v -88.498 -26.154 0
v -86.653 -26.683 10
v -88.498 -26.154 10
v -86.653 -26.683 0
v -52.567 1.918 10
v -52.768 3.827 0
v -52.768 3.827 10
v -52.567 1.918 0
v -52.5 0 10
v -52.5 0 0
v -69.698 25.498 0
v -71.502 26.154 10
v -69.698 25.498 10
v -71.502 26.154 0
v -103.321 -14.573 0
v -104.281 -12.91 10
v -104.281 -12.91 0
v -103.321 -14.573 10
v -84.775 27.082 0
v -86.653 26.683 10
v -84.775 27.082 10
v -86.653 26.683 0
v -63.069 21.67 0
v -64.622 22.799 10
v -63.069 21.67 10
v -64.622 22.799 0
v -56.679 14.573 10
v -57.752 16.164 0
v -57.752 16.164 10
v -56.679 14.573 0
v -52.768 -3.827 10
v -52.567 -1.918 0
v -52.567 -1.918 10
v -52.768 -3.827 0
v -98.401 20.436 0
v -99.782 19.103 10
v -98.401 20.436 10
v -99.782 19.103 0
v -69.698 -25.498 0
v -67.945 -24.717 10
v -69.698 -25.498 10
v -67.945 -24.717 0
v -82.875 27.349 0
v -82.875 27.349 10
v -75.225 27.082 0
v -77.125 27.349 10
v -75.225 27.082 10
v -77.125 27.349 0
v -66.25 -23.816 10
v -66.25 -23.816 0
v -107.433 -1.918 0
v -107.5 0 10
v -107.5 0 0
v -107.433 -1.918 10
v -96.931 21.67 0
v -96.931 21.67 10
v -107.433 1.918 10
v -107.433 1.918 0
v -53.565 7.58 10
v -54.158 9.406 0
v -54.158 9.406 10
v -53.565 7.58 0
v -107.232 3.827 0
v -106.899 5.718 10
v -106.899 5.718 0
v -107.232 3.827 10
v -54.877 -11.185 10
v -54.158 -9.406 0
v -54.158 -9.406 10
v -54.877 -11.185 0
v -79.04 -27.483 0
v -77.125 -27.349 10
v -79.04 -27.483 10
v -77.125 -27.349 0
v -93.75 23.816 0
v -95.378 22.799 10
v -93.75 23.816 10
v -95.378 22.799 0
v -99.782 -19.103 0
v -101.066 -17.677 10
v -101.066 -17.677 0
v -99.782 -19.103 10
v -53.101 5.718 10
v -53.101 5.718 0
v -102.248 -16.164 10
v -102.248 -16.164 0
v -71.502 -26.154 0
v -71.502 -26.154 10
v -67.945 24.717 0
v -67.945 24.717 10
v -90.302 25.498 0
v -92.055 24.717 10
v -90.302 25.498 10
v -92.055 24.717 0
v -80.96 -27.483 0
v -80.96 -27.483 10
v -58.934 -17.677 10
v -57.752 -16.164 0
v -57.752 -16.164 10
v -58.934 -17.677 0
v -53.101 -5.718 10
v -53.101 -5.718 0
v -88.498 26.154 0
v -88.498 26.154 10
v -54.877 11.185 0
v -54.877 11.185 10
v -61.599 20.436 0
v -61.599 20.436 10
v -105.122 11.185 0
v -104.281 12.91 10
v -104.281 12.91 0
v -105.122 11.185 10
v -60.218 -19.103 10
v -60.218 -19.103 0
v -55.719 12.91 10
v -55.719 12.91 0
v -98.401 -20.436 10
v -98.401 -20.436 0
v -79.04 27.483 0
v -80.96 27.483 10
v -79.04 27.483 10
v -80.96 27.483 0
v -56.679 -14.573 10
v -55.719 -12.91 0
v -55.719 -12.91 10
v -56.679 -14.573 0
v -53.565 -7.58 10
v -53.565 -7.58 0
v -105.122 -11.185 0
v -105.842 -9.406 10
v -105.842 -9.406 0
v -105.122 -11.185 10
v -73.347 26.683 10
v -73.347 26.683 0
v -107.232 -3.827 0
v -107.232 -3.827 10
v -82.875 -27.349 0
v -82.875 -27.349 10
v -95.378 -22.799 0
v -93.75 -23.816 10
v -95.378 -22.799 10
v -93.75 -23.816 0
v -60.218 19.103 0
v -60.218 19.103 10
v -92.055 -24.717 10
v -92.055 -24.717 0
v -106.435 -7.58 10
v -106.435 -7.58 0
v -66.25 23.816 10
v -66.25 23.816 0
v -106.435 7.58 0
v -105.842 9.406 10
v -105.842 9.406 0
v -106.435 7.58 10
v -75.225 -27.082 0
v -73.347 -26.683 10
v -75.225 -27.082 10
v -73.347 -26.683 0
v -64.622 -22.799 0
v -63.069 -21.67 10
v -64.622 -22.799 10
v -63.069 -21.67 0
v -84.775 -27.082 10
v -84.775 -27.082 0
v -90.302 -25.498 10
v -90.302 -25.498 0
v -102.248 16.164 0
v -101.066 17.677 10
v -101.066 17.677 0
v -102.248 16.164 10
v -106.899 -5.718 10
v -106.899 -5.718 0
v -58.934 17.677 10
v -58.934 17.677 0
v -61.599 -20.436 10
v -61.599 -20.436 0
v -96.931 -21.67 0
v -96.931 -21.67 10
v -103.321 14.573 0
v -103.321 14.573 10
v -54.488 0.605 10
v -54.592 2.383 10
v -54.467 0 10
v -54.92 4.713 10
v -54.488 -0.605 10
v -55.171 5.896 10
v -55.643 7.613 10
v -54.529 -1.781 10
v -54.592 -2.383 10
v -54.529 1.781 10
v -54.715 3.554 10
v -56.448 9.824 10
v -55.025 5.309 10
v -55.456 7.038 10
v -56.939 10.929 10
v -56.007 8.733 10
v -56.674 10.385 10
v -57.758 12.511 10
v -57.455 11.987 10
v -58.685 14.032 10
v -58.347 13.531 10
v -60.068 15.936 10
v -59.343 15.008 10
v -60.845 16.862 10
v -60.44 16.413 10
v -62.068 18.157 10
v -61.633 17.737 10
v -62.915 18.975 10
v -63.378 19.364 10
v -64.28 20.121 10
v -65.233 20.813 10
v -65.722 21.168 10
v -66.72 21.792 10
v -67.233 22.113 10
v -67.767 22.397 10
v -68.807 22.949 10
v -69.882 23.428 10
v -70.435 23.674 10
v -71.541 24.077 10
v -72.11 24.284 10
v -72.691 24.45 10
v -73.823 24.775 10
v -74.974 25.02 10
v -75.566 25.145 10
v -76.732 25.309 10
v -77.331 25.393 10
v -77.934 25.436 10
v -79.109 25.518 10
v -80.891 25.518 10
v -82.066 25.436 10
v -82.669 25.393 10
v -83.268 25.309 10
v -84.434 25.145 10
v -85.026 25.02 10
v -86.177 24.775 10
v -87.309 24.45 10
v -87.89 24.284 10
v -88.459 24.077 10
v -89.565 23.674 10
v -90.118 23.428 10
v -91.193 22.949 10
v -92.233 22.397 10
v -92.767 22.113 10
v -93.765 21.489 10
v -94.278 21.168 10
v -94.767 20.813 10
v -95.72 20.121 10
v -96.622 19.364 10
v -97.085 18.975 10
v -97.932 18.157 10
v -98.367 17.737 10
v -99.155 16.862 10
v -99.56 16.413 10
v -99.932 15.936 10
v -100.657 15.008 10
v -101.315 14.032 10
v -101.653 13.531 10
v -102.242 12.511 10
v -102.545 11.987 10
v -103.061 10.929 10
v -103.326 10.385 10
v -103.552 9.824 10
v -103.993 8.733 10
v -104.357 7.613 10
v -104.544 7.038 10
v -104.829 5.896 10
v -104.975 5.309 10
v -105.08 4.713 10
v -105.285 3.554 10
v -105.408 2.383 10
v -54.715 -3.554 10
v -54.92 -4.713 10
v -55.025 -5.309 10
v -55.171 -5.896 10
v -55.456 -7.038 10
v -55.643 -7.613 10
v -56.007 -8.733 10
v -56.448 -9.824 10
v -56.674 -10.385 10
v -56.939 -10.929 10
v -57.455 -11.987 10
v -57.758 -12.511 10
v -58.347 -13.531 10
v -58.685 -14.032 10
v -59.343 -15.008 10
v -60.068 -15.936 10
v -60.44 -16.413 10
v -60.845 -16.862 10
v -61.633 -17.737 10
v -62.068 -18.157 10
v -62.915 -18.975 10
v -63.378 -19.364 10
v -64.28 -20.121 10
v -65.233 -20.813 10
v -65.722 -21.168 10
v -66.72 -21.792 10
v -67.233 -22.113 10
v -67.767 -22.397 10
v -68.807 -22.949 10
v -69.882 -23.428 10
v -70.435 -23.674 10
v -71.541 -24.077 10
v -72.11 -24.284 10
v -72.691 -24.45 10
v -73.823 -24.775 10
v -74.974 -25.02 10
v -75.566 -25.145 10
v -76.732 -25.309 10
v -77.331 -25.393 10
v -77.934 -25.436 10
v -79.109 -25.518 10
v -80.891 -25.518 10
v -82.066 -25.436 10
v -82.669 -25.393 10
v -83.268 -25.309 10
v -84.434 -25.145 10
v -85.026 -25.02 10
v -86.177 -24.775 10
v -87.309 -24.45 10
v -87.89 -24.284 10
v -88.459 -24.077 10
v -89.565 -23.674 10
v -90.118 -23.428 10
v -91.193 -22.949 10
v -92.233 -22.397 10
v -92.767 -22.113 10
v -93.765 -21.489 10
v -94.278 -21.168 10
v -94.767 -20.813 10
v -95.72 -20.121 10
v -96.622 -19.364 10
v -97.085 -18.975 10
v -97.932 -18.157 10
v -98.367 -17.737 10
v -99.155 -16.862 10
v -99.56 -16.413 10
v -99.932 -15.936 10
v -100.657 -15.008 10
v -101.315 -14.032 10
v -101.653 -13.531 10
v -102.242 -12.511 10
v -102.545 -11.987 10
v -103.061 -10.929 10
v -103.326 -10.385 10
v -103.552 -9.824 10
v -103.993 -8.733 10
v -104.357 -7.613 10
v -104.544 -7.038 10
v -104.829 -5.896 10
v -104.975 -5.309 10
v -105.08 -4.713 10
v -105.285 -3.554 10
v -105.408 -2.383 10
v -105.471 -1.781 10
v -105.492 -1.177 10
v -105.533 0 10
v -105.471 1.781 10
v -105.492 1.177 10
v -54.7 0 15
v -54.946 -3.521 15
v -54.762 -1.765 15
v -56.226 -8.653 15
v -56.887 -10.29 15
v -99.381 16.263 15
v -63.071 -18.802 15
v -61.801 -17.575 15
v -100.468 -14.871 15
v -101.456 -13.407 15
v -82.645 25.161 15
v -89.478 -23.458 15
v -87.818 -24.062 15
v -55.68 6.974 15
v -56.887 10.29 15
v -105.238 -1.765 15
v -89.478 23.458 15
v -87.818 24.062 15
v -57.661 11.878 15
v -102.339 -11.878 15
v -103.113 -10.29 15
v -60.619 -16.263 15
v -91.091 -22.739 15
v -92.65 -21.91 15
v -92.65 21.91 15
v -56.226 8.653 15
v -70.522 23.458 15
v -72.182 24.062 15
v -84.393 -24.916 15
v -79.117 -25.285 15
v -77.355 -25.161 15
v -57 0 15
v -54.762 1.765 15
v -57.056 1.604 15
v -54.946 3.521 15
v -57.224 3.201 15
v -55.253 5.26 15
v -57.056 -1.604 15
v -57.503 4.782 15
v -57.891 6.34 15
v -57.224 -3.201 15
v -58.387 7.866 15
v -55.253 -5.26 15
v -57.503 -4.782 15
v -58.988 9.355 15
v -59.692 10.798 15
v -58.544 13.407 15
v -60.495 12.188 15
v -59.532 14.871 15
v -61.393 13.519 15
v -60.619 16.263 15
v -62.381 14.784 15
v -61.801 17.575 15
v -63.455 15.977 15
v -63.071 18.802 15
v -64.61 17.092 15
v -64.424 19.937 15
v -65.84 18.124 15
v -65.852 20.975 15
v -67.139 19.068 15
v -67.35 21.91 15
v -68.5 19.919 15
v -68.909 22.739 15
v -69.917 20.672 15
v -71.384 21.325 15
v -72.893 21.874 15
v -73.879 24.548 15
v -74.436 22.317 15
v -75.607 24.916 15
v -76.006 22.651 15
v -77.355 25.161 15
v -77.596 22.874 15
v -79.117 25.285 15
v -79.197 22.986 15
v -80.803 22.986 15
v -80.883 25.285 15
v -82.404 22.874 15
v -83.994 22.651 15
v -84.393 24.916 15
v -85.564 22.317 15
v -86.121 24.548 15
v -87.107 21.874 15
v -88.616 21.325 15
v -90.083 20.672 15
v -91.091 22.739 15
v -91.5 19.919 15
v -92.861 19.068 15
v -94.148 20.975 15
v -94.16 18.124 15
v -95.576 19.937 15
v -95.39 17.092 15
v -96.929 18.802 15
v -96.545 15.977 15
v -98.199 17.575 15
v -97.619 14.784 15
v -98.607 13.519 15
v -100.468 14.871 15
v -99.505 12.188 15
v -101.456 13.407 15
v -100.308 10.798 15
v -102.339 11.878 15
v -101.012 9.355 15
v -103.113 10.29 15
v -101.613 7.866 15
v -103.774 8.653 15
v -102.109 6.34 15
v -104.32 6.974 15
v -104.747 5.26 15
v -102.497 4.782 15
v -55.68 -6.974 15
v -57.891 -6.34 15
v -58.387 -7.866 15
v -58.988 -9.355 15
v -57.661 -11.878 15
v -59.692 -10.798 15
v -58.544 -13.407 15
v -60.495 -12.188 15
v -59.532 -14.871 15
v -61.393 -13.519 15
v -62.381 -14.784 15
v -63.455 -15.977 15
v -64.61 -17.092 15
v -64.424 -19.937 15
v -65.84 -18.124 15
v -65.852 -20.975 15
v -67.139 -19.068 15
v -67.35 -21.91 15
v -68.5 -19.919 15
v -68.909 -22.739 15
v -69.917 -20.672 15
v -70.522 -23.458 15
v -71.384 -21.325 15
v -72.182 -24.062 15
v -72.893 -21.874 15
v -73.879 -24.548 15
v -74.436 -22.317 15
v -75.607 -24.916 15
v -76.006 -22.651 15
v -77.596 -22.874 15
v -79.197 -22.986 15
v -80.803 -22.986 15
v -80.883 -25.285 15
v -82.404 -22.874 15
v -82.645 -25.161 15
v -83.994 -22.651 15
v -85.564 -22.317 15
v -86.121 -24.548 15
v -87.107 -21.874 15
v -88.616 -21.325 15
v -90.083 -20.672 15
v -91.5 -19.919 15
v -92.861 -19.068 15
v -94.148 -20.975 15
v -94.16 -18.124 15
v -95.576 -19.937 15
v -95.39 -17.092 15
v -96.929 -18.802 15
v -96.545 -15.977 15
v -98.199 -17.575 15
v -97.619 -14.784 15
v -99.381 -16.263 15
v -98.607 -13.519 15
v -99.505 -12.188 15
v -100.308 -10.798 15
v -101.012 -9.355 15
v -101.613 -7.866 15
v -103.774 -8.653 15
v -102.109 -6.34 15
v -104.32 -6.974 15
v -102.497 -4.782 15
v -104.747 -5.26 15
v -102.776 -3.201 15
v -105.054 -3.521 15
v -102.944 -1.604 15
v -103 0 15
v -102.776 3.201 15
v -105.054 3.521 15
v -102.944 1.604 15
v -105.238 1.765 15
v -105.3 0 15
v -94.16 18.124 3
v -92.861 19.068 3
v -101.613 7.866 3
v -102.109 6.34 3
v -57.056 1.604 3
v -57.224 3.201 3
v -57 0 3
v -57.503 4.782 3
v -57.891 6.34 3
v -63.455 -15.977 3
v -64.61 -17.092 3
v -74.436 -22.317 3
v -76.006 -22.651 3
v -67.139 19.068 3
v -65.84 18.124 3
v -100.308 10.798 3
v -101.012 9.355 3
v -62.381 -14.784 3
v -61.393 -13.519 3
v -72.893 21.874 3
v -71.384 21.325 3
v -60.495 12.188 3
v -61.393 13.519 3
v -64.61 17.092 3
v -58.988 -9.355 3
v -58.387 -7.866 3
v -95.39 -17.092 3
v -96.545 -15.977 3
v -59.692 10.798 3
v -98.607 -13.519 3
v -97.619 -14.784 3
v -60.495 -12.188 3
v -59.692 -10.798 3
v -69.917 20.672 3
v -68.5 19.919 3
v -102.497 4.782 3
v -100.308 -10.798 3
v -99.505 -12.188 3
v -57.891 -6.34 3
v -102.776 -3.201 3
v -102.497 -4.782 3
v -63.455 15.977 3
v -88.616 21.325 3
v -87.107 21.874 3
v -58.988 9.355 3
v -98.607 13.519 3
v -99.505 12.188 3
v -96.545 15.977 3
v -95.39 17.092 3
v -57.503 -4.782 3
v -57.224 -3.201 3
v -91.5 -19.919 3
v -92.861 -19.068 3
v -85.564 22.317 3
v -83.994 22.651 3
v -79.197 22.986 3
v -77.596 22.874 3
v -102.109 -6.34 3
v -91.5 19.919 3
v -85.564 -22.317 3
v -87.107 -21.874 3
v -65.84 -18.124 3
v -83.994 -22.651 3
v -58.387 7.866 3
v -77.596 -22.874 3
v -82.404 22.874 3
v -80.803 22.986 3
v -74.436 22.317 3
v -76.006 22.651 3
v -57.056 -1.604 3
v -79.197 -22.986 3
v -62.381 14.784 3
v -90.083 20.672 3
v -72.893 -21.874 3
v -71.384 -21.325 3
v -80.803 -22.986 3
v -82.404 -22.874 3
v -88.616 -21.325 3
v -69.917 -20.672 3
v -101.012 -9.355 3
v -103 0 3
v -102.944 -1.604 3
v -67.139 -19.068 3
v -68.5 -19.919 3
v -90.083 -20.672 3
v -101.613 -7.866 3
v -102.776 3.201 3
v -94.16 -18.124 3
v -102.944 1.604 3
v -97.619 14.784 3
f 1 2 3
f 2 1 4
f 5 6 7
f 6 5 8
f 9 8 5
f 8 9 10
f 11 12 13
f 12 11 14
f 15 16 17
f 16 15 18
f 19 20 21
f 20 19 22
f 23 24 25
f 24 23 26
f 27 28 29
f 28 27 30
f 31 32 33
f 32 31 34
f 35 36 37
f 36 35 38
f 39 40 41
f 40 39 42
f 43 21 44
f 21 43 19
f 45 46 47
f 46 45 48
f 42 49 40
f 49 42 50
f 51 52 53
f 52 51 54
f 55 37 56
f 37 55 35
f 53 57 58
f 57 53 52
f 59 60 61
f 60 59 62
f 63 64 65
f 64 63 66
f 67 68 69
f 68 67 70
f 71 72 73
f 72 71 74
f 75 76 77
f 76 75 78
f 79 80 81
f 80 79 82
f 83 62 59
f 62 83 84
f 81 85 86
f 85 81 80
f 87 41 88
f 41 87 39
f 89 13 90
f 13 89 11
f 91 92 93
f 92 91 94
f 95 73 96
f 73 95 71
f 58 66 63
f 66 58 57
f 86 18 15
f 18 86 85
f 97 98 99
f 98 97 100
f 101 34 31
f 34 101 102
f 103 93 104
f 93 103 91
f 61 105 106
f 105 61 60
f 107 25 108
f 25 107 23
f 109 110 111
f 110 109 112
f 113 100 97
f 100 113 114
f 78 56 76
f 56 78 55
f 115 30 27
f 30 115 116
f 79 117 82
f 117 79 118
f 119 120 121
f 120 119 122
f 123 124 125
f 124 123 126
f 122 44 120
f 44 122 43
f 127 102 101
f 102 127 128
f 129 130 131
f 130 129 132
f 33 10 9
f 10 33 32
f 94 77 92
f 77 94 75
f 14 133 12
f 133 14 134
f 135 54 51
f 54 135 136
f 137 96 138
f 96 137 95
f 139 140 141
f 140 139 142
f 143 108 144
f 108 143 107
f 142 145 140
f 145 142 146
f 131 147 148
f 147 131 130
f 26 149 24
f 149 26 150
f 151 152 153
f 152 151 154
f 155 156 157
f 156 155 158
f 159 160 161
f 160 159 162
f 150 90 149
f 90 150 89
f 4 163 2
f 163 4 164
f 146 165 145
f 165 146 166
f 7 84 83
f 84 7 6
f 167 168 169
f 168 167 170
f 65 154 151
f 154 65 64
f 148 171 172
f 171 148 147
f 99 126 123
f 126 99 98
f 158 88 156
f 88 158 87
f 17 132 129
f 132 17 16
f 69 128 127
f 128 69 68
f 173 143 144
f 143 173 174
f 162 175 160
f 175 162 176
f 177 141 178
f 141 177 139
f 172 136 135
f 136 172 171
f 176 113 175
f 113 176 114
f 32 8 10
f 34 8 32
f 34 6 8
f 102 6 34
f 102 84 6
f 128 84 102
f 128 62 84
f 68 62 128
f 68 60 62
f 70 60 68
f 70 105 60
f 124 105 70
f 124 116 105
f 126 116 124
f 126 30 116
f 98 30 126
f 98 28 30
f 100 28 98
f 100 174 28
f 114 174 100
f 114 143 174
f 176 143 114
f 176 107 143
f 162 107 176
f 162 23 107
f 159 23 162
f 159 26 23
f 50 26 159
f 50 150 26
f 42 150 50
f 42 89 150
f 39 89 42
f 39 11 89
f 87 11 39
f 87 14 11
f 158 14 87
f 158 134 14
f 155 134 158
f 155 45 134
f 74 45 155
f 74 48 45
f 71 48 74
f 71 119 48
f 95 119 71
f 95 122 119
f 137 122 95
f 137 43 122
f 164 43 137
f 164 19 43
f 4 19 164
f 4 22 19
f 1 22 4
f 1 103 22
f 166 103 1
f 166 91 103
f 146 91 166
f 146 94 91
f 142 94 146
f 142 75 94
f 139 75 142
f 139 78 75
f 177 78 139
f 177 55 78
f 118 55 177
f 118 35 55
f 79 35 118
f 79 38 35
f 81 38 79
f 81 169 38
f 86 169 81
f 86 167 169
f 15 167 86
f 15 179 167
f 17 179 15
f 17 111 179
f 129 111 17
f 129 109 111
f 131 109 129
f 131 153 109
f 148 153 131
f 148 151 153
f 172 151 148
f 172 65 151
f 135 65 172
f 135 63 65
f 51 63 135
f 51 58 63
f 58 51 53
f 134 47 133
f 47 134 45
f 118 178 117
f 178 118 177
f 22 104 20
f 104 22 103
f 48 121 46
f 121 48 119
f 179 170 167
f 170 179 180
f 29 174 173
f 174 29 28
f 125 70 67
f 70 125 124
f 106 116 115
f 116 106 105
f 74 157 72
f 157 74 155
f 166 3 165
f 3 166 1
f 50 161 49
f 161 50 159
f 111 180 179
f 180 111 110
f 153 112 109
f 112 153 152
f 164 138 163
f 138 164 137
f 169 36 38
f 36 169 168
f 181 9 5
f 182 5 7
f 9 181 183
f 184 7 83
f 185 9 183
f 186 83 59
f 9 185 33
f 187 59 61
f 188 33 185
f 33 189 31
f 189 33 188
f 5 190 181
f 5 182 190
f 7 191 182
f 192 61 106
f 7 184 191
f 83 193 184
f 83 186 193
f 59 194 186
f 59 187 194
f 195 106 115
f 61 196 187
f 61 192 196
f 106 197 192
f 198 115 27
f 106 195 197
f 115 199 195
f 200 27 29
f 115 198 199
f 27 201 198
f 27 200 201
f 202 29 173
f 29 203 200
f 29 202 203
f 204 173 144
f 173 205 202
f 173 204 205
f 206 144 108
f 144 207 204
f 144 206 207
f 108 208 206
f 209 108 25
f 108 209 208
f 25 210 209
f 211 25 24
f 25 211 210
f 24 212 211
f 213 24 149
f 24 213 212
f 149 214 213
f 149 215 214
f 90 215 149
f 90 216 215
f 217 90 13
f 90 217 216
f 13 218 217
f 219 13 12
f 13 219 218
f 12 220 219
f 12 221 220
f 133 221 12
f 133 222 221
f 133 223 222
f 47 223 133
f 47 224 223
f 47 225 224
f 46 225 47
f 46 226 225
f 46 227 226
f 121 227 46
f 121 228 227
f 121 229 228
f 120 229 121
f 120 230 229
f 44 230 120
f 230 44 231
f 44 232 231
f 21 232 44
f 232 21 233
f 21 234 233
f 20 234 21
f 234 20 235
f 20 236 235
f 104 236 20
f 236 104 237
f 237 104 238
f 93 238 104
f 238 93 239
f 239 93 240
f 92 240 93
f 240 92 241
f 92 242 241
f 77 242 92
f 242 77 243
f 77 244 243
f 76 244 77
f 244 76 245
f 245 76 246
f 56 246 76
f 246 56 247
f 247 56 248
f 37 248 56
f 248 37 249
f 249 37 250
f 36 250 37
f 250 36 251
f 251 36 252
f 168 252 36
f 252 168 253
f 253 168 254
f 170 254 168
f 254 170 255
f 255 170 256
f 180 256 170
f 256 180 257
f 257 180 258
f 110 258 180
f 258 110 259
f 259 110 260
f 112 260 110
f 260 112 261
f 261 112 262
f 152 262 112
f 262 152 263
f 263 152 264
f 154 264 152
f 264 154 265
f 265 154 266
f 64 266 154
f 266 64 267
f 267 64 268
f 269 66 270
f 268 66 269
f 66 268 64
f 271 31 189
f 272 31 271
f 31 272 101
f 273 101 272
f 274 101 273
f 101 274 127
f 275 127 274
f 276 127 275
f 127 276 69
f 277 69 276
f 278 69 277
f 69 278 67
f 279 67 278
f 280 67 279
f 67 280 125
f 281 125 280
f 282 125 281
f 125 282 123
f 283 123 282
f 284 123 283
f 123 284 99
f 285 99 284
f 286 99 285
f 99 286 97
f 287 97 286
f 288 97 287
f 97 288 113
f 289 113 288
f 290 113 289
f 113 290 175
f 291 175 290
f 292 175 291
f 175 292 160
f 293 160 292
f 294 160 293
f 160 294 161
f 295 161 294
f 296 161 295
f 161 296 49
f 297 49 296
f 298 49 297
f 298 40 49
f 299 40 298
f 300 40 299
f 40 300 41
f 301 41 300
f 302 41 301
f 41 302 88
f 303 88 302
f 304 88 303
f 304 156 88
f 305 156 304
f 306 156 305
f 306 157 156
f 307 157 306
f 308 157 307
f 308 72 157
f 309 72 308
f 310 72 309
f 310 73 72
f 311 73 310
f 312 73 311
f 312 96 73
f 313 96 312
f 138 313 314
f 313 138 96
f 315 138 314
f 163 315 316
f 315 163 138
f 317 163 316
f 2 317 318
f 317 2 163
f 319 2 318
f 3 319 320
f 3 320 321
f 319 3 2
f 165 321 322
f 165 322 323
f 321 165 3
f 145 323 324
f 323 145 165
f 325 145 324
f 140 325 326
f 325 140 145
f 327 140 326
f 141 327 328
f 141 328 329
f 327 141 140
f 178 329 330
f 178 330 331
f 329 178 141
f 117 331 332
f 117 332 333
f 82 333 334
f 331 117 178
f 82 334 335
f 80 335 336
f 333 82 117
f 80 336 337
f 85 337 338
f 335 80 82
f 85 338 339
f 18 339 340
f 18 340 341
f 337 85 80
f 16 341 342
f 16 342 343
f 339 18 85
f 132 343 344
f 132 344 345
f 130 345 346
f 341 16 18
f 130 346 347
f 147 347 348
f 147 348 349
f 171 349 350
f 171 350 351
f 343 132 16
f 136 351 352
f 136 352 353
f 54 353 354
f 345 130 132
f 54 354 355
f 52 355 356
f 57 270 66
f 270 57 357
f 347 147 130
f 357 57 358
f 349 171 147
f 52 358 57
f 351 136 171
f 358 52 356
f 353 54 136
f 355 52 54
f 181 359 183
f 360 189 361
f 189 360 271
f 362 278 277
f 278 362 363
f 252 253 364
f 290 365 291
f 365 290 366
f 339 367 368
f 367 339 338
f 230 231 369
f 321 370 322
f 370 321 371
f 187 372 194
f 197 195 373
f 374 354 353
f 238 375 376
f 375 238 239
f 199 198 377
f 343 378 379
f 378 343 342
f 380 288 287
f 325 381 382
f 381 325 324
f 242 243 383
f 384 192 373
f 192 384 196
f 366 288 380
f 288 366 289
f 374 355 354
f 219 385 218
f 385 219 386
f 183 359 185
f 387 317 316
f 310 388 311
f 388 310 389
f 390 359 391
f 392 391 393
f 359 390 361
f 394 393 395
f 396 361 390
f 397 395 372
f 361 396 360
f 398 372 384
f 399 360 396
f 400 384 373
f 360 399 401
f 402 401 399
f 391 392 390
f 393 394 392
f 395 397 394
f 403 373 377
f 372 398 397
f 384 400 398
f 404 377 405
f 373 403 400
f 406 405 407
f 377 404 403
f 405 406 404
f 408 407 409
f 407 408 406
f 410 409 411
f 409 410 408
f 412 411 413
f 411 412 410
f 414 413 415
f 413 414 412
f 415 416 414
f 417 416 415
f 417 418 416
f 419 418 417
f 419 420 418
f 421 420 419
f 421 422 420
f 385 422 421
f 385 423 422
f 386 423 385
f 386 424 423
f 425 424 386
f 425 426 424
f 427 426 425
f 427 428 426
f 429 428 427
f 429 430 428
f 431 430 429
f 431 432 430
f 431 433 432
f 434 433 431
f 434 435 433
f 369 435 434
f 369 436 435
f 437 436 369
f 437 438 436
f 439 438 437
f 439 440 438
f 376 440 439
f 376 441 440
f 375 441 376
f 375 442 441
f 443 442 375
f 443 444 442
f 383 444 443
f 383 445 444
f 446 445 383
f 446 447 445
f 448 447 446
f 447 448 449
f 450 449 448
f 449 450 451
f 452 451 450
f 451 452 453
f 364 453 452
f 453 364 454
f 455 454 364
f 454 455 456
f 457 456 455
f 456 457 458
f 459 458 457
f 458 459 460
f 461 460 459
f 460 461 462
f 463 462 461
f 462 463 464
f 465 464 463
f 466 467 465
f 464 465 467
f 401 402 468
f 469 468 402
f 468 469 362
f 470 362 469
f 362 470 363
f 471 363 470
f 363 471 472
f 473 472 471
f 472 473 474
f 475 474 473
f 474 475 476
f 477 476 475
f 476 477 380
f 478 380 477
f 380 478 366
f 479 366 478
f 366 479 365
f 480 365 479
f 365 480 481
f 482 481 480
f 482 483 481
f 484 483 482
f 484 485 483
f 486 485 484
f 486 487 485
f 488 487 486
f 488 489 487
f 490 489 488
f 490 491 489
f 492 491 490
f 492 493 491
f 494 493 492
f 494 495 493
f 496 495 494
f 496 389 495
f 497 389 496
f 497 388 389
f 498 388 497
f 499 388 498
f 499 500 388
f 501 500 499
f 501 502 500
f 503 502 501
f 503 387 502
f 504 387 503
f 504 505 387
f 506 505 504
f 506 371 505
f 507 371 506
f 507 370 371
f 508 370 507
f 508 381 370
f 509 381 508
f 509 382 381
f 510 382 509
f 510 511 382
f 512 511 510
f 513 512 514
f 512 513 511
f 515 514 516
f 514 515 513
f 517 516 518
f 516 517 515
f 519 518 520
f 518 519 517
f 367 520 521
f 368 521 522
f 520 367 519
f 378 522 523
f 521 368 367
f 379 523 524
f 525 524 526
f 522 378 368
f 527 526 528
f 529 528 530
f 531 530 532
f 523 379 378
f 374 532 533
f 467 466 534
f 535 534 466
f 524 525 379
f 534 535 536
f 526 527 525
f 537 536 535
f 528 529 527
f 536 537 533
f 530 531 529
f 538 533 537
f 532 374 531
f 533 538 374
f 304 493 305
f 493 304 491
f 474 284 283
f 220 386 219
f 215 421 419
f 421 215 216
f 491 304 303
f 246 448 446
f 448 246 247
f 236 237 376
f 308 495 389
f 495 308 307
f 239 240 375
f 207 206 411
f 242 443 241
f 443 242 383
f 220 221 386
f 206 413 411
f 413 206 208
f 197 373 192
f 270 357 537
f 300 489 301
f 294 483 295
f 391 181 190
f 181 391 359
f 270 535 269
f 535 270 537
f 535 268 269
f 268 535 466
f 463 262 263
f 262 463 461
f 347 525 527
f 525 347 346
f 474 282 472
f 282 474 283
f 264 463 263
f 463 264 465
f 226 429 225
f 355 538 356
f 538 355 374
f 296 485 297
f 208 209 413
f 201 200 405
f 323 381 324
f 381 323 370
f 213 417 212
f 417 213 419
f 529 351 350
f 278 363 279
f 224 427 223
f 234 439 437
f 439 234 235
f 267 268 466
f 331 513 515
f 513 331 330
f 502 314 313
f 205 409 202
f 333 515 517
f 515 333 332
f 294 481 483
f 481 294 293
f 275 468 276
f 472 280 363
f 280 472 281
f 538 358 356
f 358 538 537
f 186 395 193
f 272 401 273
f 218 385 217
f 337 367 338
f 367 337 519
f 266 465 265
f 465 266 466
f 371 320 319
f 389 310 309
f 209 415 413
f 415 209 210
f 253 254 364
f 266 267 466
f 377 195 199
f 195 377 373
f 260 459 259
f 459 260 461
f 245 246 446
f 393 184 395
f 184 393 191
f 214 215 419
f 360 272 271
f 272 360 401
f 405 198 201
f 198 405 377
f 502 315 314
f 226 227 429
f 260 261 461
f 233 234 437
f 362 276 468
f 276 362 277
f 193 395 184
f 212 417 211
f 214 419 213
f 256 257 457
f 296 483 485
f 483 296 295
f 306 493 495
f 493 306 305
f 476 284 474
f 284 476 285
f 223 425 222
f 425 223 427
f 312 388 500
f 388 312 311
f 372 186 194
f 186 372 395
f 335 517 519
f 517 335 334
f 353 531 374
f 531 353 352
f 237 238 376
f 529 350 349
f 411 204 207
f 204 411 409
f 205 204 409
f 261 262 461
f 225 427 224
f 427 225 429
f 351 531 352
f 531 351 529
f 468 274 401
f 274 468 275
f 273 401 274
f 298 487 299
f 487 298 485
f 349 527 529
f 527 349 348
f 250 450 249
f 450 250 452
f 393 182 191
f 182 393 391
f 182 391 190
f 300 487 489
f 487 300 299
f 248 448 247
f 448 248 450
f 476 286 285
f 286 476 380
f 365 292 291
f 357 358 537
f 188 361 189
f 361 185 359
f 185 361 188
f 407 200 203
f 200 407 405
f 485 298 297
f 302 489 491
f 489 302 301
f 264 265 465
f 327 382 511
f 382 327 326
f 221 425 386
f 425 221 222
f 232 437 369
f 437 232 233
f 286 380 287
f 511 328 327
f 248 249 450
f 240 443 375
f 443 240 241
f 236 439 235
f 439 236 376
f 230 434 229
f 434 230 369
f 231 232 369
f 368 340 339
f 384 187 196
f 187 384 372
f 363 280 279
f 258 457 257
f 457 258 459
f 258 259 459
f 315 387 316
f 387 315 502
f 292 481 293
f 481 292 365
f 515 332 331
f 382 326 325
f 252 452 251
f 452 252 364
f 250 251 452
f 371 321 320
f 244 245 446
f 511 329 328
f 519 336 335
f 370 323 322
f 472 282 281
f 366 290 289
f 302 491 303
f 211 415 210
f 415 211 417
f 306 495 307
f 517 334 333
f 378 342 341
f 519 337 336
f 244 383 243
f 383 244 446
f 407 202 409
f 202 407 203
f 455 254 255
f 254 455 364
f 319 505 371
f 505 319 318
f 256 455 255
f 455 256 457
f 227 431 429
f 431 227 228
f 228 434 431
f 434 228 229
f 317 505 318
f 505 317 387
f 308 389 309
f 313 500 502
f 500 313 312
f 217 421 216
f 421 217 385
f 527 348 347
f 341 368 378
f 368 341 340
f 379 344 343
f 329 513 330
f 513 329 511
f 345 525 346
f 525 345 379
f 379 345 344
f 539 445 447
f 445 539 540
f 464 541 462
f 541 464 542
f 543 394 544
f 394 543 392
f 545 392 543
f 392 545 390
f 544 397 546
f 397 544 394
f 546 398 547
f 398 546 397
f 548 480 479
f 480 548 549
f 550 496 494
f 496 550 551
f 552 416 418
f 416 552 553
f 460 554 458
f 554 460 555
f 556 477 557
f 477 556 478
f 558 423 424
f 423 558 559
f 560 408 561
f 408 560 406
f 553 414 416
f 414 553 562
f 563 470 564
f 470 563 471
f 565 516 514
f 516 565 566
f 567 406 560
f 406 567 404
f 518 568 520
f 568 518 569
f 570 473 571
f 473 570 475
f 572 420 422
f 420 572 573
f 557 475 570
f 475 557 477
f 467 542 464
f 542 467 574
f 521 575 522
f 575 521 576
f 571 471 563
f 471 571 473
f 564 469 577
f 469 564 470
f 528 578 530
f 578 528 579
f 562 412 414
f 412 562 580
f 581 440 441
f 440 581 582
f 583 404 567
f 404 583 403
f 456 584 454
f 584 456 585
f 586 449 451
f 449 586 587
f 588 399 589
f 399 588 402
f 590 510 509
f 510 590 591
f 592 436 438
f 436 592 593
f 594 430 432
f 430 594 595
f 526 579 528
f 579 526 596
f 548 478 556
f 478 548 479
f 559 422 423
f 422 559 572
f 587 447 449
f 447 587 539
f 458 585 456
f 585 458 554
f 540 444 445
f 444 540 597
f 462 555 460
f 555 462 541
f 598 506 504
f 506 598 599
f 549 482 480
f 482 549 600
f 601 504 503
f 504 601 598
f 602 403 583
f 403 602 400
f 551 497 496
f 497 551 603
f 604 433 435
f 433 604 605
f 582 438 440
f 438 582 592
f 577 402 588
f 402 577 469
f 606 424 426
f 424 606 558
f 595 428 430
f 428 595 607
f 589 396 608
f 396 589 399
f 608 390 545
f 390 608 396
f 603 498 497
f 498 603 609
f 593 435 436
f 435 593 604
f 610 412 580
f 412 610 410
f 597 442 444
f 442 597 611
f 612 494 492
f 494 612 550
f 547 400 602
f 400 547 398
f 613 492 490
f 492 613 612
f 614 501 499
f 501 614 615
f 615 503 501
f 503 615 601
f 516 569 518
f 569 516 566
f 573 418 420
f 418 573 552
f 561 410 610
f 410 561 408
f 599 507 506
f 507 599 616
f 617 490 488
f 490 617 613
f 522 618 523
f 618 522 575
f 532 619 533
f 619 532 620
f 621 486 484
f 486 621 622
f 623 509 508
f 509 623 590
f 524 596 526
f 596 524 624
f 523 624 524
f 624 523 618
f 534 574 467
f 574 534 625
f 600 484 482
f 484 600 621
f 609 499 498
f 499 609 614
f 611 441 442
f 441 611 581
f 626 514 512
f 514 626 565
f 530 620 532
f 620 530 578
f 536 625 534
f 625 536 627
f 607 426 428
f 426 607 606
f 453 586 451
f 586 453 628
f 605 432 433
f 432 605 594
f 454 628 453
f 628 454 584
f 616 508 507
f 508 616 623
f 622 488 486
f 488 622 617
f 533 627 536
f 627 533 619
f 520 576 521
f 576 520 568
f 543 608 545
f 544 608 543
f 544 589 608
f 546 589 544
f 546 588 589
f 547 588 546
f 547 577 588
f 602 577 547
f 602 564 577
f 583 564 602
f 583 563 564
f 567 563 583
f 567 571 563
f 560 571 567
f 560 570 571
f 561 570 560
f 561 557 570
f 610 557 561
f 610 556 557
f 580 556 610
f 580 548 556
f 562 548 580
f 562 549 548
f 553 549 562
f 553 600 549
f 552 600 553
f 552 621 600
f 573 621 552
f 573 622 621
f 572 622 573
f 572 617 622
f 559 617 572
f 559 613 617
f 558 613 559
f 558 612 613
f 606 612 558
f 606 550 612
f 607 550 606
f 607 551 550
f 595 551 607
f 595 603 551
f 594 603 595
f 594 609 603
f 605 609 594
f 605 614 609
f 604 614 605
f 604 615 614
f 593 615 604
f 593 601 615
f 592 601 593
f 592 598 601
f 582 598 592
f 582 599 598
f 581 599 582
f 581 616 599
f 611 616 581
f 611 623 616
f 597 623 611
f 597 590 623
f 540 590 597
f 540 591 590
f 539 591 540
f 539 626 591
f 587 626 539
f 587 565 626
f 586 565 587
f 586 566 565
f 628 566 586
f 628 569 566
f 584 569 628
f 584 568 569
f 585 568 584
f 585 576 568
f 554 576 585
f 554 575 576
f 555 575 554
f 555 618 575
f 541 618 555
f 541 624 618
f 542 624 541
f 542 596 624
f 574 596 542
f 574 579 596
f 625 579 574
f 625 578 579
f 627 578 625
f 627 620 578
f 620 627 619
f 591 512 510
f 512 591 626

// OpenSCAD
$fs=0.8; // def 1, 0.2 is high res
$fa=4;//def 12, 3 is very nice
%translate([0,0,-0.5])cube([200,200,1],center=true); //build platform

//cylinder(150,55/2,55/2);

difference() {
	union() {
	translate([-80,0,0]) cylinder(10,55/2,55/2);
	translate([-80,0,0]) cylinder(15,52/2,50.6/2);
	}
	translate([-80,0,3]) cylinder(20,46/2,46/2);
	
}
